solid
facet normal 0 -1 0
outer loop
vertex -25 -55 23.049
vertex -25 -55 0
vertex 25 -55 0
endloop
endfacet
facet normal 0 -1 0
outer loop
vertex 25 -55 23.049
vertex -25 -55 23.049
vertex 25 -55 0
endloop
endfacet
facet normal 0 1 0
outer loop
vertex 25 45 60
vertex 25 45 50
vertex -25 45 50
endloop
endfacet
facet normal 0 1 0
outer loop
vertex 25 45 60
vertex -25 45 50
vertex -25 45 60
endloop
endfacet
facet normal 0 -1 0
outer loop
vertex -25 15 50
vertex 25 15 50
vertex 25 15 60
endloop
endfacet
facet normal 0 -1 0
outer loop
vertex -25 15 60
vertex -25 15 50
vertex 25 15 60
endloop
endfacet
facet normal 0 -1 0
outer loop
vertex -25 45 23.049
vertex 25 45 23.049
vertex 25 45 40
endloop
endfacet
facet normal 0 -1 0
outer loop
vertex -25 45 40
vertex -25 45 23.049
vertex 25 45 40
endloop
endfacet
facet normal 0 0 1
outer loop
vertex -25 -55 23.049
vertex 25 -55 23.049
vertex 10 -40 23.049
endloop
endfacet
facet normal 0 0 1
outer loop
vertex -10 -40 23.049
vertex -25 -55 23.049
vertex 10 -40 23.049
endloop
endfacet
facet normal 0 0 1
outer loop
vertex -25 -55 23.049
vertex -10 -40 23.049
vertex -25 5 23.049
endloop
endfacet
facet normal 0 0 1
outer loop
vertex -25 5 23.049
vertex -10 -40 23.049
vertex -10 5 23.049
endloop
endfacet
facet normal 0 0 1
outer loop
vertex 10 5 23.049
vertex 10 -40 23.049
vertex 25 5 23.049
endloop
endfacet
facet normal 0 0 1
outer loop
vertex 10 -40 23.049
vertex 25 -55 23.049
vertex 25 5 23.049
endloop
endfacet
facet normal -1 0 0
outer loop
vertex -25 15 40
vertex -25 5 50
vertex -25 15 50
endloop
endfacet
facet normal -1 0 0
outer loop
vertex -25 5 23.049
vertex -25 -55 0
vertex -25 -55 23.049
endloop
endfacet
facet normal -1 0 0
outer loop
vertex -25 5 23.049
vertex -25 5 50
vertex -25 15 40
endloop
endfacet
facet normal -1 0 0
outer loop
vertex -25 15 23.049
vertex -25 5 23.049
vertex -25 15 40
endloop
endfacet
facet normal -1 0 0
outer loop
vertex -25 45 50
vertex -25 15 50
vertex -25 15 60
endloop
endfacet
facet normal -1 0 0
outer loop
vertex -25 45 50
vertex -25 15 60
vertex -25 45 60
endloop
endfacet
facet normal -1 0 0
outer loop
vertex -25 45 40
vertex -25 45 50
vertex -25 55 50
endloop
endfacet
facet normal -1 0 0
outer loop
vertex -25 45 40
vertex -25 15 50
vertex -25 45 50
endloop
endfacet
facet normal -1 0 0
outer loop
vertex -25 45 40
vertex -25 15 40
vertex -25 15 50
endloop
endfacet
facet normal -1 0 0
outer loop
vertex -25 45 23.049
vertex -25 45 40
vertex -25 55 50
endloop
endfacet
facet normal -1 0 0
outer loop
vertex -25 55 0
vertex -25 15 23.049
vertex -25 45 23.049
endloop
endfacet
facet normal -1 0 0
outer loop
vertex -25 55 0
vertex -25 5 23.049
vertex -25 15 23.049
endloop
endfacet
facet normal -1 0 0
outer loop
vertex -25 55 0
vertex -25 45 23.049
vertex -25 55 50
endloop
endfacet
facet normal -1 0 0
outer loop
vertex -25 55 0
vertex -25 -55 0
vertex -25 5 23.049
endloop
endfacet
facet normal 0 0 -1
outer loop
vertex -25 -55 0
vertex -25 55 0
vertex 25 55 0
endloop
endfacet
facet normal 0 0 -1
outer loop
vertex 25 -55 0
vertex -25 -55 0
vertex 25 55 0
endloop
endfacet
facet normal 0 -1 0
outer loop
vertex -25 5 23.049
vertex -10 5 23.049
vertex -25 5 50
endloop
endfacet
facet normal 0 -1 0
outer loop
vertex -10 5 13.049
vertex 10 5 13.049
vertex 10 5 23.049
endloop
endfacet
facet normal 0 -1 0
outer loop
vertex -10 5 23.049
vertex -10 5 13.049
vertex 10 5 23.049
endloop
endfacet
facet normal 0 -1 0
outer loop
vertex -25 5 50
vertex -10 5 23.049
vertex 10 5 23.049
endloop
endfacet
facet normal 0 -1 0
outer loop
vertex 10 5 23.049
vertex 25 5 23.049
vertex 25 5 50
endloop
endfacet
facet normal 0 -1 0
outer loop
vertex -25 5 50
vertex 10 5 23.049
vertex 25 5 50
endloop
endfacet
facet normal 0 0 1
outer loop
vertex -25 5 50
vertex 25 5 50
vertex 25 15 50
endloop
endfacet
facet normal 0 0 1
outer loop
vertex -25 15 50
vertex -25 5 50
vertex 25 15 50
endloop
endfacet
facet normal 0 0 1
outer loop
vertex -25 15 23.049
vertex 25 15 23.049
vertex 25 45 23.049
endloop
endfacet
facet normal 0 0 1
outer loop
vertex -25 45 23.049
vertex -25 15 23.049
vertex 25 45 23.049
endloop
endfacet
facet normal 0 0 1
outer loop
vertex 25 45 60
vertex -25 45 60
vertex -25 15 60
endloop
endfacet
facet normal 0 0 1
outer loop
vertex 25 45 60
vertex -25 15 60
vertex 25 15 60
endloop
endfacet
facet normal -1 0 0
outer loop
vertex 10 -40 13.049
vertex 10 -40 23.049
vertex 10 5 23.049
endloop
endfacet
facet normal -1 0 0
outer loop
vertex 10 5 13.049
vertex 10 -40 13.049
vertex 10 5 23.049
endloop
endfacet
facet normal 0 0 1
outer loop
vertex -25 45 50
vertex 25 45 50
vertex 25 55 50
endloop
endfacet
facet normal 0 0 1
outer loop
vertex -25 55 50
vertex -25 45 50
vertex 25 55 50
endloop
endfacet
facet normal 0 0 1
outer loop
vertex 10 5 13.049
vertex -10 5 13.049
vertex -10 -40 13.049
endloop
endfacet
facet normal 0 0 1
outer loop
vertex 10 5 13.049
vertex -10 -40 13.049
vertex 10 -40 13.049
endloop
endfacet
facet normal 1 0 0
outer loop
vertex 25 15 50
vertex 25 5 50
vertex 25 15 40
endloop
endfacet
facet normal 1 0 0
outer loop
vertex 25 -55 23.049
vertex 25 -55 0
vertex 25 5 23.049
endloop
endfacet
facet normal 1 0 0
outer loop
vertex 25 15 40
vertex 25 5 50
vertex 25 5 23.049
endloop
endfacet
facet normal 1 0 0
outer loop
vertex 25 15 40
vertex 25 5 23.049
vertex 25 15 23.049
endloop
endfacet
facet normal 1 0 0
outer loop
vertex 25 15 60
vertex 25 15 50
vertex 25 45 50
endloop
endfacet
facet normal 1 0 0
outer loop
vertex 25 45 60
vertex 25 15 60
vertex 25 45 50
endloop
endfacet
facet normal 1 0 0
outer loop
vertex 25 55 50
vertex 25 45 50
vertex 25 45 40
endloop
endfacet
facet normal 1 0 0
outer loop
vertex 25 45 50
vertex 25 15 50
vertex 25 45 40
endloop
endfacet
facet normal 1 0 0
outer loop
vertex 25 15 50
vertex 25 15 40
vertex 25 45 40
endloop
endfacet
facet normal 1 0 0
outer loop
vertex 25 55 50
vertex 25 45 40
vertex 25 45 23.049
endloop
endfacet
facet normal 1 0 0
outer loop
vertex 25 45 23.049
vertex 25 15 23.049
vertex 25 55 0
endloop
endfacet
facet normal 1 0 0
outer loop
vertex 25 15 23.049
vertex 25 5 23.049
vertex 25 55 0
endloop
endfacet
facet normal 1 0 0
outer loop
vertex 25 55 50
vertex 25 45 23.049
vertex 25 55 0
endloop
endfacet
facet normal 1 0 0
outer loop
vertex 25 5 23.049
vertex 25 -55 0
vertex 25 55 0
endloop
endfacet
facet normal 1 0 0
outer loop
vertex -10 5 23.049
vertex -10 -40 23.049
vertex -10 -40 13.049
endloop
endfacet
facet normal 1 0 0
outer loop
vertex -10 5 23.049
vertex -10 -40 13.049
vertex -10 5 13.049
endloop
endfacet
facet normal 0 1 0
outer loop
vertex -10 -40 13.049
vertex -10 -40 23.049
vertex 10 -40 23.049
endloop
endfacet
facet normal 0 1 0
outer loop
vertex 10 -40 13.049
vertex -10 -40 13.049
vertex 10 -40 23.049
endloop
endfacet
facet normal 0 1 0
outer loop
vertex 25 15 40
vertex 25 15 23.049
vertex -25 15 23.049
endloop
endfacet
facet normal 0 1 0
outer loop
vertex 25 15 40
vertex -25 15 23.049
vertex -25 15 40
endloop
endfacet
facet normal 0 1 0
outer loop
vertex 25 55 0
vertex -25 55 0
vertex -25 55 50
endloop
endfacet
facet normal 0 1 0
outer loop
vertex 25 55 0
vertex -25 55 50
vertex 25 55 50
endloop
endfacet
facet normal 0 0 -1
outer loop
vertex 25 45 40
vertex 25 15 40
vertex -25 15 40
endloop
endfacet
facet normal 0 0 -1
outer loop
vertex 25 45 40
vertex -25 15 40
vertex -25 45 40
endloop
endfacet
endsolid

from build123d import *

# Parameters (mm, degrees)
F0_W     = 50
F0_H     = 110
F1_DEPTH = 60
F2_W     = 30
F2_H     = 16.95089
F2_W_2   = 10
F2_H_2   = 10
F3_DEPTH = 50.001
F4_W     = 20
F4_H     = 45
F5_DEPTH = 10


with BuildPart() as f1:
    # F0 (on Top) → F1 (new body)
    with BuildSketch(Plane.XY):
        Rectangle(F0_W, F0_H)
    extrude(amount=F1_DEPTH)

    # F2 (on face) → F3 (cut, through all)
    with BuildSketch(Plane.YZ.offset(25)):
        with Locations((30, 31.524555)):
            Rectangle(F2_W, F2_H)
        with Locations((50, 55)):
            Rectangle(F2_W_2, F2_H_2)
        with Locations((10, 55)):
            Rectangle(F2_W_2, F2_H_2)
        Polygon((5, 50), (5, 60), (-55, 60), (-55, 23.04911), (5, 23.04911), align=None)
    extrude(amount=-F3_DEPTH, mode=Mode.SUBTRACT)

    # F4 (on face) → F5 (cut)
    with BuildSketch(Plane.XY.offset(23.04911)):
        with Locations((0, -17.5)):
            Rectangle(F4_W, F4_H)
    extrude(amount=-F5_DEPTH, mode=Mode.SUBTRACT)


solid = f1.part
